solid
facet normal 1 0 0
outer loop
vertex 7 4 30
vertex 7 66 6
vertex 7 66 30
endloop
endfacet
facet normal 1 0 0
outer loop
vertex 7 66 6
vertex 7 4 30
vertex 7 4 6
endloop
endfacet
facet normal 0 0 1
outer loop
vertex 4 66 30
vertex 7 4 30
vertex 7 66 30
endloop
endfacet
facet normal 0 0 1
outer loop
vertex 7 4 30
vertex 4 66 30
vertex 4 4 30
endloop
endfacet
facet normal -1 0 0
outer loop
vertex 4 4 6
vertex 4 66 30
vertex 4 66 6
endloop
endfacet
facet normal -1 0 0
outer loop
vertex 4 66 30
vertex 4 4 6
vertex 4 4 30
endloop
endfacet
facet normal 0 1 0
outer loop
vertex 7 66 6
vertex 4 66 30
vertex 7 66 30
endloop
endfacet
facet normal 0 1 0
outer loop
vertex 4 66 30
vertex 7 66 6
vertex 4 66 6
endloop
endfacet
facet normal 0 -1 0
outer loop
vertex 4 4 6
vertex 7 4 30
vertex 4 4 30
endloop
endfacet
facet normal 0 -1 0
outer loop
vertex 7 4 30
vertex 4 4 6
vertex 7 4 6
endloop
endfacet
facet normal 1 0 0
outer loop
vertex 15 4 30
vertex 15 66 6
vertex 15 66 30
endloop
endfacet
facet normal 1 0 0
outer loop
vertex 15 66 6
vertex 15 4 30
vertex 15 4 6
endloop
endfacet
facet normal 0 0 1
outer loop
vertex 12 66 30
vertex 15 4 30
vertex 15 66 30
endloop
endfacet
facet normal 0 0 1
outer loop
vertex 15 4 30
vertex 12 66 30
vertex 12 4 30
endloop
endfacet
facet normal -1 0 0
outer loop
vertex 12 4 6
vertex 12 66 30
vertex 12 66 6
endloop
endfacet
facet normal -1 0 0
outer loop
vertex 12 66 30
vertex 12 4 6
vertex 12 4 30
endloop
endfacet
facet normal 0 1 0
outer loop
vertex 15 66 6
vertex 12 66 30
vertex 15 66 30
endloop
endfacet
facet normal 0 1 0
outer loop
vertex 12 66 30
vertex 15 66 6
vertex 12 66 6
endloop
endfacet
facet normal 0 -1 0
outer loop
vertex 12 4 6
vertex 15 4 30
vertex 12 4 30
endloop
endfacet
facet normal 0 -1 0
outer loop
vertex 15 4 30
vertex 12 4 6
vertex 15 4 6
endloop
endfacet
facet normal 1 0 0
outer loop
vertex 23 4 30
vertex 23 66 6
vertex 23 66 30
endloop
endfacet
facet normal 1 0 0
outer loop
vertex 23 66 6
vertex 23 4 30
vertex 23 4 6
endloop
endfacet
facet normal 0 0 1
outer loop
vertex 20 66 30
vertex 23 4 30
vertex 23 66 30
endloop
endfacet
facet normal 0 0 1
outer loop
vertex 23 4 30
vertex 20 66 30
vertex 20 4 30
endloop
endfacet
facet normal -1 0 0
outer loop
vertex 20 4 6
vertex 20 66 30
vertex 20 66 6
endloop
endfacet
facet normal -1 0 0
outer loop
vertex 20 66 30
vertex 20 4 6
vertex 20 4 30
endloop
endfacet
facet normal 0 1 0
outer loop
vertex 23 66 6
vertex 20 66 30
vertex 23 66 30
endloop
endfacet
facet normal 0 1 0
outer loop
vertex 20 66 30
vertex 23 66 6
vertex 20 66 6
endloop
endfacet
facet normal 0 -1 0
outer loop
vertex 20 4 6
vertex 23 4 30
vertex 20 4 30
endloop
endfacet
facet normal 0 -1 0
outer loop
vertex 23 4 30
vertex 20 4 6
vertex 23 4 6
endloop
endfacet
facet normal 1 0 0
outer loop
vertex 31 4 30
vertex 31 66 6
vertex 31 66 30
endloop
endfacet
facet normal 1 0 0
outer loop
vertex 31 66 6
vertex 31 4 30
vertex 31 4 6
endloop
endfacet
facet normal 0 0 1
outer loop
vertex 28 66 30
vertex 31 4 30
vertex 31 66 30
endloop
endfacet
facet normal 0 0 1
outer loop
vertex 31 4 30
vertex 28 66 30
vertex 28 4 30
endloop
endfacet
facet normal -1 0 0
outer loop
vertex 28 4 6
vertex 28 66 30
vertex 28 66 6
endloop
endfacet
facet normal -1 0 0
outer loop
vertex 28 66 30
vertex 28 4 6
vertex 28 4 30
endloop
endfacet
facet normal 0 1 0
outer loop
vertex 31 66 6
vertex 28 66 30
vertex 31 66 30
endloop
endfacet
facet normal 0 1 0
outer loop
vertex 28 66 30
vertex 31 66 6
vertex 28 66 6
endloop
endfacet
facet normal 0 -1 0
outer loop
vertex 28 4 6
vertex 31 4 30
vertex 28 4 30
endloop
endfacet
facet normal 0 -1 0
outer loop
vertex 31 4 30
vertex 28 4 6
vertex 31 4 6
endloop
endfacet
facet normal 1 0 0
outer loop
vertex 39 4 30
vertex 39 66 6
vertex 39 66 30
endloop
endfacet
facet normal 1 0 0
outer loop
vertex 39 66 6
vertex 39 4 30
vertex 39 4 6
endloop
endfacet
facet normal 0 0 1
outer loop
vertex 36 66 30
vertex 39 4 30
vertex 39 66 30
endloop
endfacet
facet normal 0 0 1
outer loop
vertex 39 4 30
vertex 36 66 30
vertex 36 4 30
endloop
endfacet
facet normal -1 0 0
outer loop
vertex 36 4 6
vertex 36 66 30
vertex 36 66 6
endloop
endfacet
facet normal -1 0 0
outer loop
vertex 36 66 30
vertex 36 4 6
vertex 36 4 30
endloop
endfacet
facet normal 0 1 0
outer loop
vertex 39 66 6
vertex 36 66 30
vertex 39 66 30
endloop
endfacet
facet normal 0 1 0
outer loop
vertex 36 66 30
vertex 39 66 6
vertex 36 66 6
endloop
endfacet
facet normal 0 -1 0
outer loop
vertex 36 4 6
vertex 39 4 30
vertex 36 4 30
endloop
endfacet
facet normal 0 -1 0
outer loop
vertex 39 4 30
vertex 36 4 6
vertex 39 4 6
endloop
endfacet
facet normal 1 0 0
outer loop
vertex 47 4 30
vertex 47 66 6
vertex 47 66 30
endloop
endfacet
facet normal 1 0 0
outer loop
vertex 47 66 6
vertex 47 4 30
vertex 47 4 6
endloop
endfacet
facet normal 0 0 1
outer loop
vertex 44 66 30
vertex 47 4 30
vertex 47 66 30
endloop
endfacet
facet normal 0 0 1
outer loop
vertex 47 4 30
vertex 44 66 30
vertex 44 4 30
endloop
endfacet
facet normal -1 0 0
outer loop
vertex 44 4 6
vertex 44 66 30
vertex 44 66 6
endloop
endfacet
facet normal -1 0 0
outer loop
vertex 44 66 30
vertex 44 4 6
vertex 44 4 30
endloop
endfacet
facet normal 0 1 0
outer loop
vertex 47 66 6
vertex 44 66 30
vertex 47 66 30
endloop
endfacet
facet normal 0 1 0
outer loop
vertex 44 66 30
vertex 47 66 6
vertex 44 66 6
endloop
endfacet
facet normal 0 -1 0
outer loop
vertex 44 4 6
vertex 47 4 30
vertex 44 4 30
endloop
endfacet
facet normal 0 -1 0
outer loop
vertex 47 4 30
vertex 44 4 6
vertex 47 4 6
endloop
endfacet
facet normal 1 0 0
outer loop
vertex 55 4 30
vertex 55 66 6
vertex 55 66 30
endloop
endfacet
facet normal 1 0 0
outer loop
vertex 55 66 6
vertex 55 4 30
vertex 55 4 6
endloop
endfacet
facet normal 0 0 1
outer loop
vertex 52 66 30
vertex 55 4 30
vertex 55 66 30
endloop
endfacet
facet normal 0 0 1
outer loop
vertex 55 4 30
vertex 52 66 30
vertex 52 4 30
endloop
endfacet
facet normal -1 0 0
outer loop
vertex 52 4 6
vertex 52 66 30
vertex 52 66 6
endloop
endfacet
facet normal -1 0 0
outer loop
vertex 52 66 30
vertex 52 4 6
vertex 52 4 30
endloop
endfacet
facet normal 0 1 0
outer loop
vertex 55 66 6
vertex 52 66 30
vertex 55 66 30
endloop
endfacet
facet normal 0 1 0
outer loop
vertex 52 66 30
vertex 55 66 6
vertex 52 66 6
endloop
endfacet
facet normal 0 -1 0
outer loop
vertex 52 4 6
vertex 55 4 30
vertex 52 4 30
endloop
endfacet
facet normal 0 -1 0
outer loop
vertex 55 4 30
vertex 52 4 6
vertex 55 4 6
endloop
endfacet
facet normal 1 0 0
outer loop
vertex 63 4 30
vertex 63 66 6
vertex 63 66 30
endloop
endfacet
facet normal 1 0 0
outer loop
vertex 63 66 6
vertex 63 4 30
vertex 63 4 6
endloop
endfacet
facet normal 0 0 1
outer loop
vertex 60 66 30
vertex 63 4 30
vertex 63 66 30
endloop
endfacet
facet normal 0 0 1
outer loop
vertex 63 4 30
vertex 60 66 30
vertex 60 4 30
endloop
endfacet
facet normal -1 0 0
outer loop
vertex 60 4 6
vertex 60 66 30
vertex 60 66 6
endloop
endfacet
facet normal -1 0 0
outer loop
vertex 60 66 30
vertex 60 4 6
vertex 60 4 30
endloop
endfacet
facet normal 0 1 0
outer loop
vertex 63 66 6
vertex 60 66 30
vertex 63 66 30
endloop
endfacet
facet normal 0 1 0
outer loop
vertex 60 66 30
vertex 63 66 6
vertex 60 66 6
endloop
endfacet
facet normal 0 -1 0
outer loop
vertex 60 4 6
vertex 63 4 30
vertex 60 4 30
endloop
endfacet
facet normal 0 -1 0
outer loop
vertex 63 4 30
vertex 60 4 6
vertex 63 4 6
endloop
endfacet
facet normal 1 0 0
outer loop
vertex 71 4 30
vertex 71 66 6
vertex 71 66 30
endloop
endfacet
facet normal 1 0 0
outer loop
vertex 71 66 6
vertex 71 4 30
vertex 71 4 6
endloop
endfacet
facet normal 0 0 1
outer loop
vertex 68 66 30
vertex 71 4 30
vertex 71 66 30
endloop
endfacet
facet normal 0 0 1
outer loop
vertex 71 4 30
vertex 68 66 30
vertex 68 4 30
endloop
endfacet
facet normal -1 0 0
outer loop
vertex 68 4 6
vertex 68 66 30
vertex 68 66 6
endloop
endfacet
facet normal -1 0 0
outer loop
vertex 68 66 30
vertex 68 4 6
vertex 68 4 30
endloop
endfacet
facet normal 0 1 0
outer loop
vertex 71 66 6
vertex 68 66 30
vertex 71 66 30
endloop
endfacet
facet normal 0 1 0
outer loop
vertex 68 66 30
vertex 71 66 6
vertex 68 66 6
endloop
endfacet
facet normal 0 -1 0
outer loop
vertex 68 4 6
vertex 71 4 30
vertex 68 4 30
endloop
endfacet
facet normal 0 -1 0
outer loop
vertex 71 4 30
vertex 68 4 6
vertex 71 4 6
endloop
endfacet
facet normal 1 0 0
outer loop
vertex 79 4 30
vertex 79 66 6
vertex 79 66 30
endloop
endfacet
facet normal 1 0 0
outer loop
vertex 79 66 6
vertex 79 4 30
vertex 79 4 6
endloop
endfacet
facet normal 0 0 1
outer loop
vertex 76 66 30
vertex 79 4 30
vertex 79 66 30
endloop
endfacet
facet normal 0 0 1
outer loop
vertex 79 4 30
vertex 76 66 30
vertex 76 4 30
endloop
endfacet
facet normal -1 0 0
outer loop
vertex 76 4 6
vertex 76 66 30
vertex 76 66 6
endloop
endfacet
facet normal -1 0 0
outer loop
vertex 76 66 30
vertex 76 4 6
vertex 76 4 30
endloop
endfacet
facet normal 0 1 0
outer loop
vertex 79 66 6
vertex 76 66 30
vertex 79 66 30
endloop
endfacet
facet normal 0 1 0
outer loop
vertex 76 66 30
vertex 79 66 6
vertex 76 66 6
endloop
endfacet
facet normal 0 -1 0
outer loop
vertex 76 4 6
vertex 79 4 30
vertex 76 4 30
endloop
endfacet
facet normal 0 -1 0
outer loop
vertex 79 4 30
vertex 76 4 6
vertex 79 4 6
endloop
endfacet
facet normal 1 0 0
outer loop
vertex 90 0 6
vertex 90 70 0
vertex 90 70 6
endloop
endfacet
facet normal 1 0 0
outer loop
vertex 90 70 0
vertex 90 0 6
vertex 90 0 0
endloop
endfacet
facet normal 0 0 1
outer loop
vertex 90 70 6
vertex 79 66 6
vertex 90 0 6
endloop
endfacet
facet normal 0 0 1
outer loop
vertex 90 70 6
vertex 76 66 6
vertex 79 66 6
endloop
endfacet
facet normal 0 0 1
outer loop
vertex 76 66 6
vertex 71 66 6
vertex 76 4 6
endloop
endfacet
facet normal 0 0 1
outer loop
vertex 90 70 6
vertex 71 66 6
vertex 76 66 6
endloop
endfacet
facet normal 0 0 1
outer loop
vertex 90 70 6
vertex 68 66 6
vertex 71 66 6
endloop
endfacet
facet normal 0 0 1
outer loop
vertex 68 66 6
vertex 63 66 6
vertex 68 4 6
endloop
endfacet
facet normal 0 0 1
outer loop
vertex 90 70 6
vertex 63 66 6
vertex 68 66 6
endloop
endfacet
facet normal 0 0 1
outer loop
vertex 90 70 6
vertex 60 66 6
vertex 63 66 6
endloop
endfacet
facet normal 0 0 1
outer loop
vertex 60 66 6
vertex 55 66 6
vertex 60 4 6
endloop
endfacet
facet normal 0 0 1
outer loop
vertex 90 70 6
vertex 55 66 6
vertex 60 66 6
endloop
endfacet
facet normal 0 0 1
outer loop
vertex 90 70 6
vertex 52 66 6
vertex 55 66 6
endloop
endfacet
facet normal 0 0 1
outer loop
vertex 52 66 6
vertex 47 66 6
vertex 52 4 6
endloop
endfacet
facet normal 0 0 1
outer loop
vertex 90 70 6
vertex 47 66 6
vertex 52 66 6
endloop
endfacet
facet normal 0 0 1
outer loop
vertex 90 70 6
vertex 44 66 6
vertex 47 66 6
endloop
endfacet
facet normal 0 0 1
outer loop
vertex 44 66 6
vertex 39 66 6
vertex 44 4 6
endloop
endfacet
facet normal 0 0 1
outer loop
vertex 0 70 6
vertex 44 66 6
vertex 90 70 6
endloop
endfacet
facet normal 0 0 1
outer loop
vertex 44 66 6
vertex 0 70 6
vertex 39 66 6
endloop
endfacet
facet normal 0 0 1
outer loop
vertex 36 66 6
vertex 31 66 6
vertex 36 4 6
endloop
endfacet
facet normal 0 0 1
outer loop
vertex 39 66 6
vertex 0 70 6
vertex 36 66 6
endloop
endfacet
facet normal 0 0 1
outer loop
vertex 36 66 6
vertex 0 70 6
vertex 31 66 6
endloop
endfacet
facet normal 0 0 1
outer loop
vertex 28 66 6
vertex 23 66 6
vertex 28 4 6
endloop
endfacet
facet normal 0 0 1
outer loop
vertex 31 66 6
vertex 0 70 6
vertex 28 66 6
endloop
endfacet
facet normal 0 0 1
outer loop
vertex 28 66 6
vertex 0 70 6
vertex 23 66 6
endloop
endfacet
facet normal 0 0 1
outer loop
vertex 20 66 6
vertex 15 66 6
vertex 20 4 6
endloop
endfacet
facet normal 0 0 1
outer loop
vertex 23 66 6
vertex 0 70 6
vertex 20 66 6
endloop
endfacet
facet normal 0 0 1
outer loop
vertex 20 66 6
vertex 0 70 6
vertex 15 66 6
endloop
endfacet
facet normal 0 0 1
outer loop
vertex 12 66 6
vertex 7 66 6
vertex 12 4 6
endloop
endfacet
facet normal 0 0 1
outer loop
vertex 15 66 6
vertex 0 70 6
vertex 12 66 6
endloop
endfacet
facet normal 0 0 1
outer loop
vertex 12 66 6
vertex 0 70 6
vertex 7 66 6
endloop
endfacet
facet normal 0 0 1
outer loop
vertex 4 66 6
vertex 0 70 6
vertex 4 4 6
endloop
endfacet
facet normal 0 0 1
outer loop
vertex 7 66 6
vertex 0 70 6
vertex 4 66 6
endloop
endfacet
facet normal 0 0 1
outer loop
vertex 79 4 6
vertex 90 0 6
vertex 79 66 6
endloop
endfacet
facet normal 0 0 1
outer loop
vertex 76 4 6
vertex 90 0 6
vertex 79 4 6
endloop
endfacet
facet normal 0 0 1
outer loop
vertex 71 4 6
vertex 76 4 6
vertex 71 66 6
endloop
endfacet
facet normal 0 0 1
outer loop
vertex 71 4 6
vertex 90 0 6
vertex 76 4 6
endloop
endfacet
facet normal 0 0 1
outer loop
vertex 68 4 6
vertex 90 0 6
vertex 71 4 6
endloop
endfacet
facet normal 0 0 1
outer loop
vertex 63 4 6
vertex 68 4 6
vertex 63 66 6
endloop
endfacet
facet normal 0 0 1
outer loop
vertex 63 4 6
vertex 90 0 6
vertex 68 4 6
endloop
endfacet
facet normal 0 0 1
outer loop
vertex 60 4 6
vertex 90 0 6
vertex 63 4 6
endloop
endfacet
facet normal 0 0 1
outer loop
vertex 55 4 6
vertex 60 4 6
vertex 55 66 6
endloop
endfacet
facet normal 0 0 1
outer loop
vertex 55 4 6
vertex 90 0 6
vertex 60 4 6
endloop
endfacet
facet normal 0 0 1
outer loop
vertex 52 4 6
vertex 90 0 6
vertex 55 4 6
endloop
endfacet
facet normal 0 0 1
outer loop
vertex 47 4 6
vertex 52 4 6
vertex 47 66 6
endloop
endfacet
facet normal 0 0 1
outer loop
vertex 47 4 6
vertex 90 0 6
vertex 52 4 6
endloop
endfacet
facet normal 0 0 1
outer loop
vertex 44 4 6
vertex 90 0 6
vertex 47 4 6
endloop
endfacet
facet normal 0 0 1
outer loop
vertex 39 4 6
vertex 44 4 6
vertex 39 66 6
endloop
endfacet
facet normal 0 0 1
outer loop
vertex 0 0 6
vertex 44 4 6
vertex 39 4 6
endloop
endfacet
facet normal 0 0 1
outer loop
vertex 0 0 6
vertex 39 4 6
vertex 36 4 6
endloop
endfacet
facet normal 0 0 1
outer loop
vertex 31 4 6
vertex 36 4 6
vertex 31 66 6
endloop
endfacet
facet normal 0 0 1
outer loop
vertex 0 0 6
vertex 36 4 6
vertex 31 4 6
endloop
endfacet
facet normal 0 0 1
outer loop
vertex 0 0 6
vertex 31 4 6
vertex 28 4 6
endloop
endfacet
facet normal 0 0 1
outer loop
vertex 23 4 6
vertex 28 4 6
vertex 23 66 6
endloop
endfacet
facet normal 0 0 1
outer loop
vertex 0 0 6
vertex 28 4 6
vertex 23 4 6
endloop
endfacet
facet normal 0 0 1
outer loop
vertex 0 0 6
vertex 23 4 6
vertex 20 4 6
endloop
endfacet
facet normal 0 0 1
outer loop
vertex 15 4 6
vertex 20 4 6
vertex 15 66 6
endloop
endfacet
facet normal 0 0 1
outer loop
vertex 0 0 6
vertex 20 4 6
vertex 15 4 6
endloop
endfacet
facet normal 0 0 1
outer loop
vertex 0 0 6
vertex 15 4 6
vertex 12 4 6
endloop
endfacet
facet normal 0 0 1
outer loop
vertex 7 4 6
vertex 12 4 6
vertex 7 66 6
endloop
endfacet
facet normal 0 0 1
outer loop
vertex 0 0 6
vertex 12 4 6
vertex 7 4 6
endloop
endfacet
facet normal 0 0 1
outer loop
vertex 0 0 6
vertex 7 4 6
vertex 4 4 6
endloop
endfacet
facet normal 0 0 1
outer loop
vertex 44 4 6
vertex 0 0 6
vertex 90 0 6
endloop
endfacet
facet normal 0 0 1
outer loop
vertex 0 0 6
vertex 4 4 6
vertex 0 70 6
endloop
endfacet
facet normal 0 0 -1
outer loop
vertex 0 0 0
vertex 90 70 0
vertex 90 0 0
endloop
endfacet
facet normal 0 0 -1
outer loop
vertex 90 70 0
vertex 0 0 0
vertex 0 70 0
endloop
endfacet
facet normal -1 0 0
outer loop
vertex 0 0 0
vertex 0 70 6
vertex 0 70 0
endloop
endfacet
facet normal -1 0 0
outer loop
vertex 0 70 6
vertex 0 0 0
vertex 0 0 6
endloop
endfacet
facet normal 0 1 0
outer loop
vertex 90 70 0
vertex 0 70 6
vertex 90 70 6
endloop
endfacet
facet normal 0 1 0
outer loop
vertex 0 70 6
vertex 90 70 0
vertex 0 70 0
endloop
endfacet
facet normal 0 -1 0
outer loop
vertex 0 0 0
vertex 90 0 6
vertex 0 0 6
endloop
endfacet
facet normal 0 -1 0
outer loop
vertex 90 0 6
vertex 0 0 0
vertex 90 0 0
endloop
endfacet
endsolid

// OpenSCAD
$fn = 32;

// ----------------------------------------------------------------------
// Heatsink: uniform fin block
// ----------------------------------------------------------------------

// --- parameters (mm) ---
base_l = 90;              // base length, X
base_w = 70;              // base width, Y
base_t = 6;               // base plate thickness
fin_h = 25;               // fin height above the base
fin_t = 3;                // fin thickness
edge = 4;                 // margin from the base ends
pitch = 8;                // fin pitch

n_fins = floor((base_l - 2 * edge - fin_t) / pitch) + 1;  // fin count
total_h = base_t + fin_h - 1;  // overall height

union() {
  cube([base_l, base_w, base_t]);
  for (i = [0 : n_fins - 1])
    translate([edge + i * pitch, edge, base_t - 1])
      cube([fin_t, base_w - 2 * edge, fin_h]);
}
